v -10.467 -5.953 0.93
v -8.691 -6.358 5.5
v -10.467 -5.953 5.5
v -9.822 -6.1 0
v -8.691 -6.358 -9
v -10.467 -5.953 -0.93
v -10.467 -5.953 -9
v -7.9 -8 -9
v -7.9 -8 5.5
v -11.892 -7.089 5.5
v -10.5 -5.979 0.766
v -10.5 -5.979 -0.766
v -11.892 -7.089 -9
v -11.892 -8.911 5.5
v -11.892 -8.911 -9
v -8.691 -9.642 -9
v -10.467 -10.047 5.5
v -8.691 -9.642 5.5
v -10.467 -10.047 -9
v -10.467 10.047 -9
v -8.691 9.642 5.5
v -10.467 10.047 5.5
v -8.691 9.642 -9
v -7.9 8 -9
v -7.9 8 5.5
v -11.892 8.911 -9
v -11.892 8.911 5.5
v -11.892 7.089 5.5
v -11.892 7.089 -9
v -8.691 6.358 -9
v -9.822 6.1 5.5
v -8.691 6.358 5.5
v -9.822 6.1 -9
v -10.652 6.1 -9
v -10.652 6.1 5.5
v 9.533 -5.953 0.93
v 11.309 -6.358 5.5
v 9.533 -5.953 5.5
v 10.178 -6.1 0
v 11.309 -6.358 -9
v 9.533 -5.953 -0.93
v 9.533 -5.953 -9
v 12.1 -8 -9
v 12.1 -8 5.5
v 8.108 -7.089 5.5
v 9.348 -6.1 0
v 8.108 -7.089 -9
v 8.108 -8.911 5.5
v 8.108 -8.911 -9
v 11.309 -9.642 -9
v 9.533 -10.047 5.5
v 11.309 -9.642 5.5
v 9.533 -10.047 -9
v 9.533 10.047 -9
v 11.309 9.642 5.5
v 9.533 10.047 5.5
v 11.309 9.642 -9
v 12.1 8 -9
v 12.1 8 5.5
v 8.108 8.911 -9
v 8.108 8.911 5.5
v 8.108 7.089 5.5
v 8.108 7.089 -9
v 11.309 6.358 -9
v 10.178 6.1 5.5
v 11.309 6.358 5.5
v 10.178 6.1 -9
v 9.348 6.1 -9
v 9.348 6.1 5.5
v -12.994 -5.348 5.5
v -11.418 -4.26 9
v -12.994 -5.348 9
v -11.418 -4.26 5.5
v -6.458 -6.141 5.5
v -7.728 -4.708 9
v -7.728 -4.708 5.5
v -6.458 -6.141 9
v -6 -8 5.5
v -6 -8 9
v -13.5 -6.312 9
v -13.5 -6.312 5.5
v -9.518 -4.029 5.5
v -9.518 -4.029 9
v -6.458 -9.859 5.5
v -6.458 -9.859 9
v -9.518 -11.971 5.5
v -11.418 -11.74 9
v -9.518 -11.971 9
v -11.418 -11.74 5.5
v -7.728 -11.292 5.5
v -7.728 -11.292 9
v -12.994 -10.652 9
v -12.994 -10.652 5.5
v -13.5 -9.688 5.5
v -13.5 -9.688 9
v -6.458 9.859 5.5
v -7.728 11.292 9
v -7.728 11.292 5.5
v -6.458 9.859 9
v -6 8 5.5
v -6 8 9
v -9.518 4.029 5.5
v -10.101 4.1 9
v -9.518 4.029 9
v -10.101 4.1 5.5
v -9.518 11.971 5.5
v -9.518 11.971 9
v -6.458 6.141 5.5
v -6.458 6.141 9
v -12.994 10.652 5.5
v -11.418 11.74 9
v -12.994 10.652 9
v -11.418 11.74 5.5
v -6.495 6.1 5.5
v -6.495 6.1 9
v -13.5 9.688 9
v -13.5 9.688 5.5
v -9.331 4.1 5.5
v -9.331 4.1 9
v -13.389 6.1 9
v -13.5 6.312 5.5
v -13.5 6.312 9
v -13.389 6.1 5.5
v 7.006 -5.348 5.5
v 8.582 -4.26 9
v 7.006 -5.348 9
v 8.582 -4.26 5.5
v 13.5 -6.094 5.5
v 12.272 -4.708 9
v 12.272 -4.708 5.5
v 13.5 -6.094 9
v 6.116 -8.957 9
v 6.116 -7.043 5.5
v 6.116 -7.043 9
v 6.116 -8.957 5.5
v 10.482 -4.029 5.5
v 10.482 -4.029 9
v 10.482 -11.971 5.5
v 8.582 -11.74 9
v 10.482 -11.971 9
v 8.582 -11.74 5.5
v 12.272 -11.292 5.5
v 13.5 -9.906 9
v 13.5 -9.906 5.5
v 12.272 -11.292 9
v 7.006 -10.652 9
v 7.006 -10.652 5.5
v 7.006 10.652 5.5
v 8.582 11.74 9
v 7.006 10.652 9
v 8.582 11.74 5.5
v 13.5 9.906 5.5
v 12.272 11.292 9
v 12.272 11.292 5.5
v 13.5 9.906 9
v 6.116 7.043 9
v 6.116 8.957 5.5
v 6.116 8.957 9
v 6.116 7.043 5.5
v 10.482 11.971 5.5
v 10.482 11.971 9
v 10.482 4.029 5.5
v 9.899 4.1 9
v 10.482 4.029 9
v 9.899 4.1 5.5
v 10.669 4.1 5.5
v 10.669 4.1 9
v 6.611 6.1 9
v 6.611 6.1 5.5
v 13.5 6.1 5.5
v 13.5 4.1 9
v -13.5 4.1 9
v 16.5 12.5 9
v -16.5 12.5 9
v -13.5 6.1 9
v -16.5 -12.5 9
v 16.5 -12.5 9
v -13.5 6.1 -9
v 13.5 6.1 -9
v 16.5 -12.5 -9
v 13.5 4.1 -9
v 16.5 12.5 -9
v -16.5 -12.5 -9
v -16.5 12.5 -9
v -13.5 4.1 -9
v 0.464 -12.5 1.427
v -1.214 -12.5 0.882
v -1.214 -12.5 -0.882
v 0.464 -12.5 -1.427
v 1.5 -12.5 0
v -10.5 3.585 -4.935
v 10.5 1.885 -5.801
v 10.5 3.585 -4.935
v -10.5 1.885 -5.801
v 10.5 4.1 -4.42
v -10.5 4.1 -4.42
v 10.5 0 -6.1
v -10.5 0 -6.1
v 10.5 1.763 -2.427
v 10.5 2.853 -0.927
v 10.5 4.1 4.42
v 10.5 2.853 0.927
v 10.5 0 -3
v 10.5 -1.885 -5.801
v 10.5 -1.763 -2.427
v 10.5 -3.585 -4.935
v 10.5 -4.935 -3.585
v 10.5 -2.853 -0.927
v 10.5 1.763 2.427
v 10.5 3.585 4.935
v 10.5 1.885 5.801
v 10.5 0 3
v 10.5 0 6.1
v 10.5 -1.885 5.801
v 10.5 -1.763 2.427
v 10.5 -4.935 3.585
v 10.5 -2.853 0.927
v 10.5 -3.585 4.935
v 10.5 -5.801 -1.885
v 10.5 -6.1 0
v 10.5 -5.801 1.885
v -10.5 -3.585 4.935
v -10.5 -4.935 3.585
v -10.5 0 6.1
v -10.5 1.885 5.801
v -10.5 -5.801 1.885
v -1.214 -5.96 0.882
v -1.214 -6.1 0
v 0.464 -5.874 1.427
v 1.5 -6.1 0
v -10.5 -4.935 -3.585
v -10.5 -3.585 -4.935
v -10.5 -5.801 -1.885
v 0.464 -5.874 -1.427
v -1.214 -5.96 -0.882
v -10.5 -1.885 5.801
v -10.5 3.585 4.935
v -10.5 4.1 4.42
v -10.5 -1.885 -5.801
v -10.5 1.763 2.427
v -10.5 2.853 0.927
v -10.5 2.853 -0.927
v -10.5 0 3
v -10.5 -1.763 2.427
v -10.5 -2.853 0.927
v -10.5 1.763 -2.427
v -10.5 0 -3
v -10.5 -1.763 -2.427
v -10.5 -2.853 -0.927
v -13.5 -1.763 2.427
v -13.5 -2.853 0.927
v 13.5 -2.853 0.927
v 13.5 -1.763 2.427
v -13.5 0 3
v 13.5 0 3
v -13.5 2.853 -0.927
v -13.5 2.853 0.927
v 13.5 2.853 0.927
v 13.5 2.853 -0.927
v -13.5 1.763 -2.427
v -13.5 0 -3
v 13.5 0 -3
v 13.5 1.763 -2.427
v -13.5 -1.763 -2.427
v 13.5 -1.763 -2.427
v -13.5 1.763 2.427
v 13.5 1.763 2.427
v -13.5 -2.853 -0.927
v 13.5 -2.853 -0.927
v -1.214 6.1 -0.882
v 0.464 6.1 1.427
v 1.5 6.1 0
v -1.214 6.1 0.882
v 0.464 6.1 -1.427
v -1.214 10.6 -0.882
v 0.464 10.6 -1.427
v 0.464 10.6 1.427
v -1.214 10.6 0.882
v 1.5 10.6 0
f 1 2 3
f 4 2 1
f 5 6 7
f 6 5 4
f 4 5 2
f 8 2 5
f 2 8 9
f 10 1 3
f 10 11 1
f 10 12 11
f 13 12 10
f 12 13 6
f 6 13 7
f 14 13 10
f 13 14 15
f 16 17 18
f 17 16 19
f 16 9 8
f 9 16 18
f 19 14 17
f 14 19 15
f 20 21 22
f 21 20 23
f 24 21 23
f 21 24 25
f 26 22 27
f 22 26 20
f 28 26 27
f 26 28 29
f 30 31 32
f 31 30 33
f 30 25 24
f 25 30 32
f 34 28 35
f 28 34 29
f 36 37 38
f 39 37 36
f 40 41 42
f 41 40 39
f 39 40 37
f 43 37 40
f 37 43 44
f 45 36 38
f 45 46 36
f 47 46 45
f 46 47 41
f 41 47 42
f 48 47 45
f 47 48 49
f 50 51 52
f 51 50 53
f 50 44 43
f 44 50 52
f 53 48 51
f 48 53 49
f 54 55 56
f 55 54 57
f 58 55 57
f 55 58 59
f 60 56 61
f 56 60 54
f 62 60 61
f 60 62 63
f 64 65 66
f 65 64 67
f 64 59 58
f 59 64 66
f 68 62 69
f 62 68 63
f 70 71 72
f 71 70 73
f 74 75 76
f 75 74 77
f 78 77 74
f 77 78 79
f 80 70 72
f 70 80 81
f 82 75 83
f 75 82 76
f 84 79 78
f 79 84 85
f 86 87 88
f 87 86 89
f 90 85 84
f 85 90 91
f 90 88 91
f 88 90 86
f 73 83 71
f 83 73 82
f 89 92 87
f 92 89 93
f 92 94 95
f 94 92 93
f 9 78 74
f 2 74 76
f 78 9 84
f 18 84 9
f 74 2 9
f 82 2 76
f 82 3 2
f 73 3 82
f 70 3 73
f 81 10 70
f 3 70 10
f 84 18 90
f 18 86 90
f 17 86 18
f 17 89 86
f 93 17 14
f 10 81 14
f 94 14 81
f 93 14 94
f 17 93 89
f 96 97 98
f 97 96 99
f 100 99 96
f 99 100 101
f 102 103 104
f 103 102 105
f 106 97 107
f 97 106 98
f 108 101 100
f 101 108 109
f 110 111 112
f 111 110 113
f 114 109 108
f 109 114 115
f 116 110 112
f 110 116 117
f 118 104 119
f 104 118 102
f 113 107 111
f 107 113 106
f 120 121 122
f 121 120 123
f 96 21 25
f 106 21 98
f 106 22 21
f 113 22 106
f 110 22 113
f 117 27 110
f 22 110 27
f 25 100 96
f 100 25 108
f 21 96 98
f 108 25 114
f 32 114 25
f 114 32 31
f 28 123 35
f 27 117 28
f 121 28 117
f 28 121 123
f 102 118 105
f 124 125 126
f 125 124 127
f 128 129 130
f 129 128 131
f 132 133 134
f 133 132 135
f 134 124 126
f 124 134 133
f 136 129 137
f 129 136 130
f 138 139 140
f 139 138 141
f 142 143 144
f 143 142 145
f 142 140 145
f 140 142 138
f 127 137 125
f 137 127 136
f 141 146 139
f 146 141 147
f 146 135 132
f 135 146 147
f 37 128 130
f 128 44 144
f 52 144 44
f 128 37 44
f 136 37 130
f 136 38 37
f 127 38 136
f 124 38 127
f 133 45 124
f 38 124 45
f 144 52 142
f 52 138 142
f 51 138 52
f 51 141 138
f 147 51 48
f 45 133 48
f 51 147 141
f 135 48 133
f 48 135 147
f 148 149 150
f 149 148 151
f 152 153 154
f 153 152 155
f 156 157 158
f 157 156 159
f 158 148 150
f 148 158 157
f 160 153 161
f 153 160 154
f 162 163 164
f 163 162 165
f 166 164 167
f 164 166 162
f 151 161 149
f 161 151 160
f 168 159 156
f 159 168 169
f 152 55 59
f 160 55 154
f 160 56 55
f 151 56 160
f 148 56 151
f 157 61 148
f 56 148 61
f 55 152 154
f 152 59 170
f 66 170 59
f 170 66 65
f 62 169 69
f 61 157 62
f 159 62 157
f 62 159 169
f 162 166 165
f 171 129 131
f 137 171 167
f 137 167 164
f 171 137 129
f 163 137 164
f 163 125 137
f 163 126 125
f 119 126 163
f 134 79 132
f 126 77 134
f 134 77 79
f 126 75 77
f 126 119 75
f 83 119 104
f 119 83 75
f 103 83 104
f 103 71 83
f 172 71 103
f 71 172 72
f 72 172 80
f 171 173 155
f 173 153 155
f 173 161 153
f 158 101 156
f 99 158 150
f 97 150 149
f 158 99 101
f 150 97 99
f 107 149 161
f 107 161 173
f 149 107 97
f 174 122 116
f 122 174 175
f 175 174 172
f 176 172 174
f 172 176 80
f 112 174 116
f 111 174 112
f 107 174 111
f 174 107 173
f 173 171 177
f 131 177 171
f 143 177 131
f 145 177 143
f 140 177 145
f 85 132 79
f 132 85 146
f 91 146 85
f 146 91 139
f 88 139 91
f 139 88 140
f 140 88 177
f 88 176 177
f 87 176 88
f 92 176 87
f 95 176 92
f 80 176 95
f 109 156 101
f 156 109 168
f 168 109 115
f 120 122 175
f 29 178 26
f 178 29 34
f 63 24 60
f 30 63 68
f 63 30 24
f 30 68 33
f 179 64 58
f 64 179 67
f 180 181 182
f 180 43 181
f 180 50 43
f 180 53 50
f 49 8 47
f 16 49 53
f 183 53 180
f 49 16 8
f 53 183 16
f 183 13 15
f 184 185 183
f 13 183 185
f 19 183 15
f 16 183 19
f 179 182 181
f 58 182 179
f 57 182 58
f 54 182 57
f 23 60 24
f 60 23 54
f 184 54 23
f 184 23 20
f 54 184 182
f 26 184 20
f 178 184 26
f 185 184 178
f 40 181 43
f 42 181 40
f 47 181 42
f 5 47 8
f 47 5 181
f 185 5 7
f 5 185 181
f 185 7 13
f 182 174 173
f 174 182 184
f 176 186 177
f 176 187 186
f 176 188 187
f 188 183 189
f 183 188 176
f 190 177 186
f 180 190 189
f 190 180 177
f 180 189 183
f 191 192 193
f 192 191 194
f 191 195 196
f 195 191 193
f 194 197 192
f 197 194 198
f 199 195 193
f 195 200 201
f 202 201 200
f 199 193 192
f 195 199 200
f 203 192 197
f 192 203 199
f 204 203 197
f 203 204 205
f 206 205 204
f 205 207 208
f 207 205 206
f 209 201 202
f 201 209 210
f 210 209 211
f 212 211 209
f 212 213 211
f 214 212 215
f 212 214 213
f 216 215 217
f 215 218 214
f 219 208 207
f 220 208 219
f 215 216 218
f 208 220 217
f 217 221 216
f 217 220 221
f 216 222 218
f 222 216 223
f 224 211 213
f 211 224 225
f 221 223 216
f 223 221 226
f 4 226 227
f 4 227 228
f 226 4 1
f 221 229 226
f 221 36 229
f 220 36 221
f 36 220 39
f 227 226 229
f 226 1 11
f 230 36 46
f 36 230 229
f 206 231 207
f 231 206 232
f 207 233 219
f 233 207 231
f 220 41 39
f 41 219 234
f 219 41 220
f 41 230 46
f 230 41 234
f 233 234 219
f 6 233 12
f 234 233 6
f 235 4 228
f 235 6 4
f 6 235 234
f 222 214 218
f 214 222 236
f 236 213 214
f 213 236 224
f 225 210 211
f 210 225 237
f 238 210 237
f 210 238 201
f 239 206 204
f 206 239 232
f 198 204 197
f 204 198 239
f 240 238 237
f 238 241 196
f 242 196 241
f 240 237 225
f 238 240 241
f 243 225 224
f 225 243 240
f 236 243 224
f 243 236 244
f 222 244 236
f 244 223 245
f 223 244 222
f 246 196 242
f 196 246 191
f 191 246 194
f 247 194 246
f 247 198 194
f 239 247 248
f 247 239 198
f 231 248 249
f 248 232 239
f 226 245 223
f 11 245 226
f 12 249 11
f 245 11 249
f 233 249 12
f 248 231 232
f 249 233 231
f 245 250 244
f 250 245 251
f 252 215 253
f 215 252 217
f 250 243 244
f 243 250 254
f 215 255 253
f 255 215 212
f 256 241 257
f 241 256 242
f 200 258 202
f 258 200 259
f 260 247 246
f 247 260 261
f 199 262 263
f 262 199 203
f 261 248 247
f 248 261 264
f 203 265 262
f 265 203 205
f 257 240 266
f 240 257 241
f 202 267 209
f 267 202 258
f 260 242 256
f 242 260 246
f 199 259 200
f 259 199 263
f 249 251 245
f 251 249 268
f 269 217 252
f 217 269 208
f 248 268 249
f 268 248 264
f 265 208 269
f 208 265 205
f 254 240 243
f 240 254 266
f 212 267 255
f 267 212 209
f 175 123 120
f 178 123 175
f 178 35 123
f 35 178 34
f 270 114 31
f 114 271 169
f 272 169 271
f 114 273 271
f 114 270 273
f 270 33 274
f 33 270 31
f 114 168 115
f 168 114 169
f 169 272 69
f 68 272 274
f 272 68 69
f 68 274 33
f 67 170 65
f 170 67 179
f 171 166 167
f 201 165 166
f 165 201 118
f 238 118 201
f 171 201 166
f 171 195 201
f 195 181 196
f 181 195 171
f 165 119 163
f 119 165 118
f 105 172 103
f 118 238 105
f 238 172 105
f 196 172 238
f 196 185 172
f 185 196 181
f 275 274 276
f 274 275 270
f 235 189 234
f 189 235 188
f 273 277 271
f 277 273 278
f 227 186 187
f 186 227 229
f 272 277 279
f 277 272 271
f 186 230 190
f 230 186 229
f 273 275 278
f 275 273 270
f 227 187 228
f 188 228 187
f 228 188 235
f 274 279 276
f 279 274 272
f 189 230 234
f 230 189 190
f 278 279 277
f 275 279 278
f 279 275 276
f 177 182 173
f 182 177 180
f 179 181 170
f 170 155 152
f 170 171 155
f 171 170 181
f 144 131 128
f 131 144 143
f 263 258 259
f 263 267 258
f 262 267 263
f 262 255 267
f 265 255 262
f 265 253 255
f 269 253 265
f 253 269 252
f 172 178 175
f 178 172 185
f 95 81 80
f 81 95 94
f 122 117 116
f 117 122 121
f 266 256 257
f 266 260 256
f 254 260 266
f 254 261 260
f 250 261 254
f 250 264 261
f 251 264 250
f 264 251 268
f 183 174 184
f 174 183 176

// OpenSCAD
// Parameters
shaft_diameter = 6.0; //[3.0:12.0:0.1]
block_length = 30.0; //[15.0:60.0:0.5]
block_width = 25.0; //[12.5:50.0:0.5]
block_height = 18.0; //[9.0:36.0:0.5]
bearing_outer_diameter = 12.0; //[8.0:24.0:0.1]
bearing_length = 19.0; //[10.0:38.0:0.5]
bearing_fit_clearance = 0.2; //[0.0:0.6:0.05]
mount_hole_diameter = 4.2; //[2.5:8.0:0.1]
mount_hole_spacing_x = 20.0; //[10.0:40.0:0.5]
mount_hole_spacing_y = 16.0; //[8.0:32.0:0.5]
fastener_head_recess_diameter = 8.0; //[5.0:16.0:0.1]
fastener_head_recess_depth = 3.0; //[1.0:8.0:0.1]
clamp_slot_width = 2.0; //[1.0:5.0:0.1]
clamp_screw_diameter = 3.0; //[2.0:6.0:0.1]
overlap = 1.0; //[0.5:2.0:0.1]

// SCS Bearing Block
module scs_bearing_block() {
  color([0.85, 0.85, 0.8]) {
    difference() {
      // Main block body (single solid)
      cube([block_length, block_width, block_height], center=true);

      // Bearing seat (along X)
      rotate([0, 90, 0])
        cylinder(r=(bearing_outer_diameter + bearing_fit_clearance)/2,
                 h=bearing_length + 2*overlap, center=true);

      // Shaft through bore (along X)
      rotate([0, 90, 0])
        cylinder(r=shaft_diameter/2,
                 h=block_length + 2*overlap, center=true);

      // Mounting holes (along Z)
      for (x = [-1, 1])
        for (y = [-1, 1])
          translate([x * mount_hole_spacing_x/2, y * mount_hole_spacing_y/2, 0])
            cylinder(r=mount_hole_diameter/2,
                     h=block_height + 2*overlap, center=true);

      // Counterbores (top face)
      for (x = [-1, 1])
        for (y = [-1, 1])
          translate([x * mount_hole_spacing_x/2,
                     y * mount_hole_spacing_y/2,
                     block_height/2 - fastener_head_recess_depth/2])
            cylinder(r=fastener_head_recess_diameter/2,
                     h=fastener_head_recess_depth + overlap, center=true);

      // Clamp slot (cuts from +Y side into the bearing seat)
      translate([0,
                 (bearing_outer_diameter + bearing_fit_clearance)/2 - clamp_slot_width/2,
                 0])
        cube([block_length + 2*overlap, clamp_slot_width, block_height + 2*overlap], center=true);

      // Clamp screw hole (across width, along Y)
      rotate([90, 0, 0])
        translate([0, 0, block_height/2 - (bearing_outer_diameter + bearing_fit_clearance)/2])
          cylinder(r=clamp_screw_diameter/2,
                   h=block_width + 2*overlap, center=true);
    }
  }
}

// Connected "hole position" markers
// FIX: Make them real attached plates (not tiny cubes) and overlap into the main body.
// This removes the floating/disconnected thin section and any visible gap.
module side_plate_marker(side=+1) { // side: +1 => +X, -1 => -X
  plate_thickness = 3.0;                 // visible thin plate
  plate_height    = block_height;        // match block height
  plate_width     = block_width;         // match block width
  attach_overlap  = 1.5;                 // 1-2mm guaranteed overlap into main body

  // Center of plate: just outside the face, but pushed in by attach_overlap so it intersects.
  x_pos = side * (block_length/2 + plate_thickness/2 - attach_overlap);

  color([0.75, 0.75, 0.77])
    translate([x_pos, 0, 0])
      cube([plate_thickness, plate_width, plate_height], center=true);
}

// SCS Bearing Block Assembly (unioned into one connected solid)
module scs_bearing_block_assembly() {
  union() {
    scs_bearing_block();

    // FIX: Replace floating markers with attached side plates that overlap the body.
    side_plate_marker(+1);
    side_plate_marker(-1);
  }
}

// Final Assembly
module assembly() {
  scs_bearing_block_assembly();
}

assembly();
